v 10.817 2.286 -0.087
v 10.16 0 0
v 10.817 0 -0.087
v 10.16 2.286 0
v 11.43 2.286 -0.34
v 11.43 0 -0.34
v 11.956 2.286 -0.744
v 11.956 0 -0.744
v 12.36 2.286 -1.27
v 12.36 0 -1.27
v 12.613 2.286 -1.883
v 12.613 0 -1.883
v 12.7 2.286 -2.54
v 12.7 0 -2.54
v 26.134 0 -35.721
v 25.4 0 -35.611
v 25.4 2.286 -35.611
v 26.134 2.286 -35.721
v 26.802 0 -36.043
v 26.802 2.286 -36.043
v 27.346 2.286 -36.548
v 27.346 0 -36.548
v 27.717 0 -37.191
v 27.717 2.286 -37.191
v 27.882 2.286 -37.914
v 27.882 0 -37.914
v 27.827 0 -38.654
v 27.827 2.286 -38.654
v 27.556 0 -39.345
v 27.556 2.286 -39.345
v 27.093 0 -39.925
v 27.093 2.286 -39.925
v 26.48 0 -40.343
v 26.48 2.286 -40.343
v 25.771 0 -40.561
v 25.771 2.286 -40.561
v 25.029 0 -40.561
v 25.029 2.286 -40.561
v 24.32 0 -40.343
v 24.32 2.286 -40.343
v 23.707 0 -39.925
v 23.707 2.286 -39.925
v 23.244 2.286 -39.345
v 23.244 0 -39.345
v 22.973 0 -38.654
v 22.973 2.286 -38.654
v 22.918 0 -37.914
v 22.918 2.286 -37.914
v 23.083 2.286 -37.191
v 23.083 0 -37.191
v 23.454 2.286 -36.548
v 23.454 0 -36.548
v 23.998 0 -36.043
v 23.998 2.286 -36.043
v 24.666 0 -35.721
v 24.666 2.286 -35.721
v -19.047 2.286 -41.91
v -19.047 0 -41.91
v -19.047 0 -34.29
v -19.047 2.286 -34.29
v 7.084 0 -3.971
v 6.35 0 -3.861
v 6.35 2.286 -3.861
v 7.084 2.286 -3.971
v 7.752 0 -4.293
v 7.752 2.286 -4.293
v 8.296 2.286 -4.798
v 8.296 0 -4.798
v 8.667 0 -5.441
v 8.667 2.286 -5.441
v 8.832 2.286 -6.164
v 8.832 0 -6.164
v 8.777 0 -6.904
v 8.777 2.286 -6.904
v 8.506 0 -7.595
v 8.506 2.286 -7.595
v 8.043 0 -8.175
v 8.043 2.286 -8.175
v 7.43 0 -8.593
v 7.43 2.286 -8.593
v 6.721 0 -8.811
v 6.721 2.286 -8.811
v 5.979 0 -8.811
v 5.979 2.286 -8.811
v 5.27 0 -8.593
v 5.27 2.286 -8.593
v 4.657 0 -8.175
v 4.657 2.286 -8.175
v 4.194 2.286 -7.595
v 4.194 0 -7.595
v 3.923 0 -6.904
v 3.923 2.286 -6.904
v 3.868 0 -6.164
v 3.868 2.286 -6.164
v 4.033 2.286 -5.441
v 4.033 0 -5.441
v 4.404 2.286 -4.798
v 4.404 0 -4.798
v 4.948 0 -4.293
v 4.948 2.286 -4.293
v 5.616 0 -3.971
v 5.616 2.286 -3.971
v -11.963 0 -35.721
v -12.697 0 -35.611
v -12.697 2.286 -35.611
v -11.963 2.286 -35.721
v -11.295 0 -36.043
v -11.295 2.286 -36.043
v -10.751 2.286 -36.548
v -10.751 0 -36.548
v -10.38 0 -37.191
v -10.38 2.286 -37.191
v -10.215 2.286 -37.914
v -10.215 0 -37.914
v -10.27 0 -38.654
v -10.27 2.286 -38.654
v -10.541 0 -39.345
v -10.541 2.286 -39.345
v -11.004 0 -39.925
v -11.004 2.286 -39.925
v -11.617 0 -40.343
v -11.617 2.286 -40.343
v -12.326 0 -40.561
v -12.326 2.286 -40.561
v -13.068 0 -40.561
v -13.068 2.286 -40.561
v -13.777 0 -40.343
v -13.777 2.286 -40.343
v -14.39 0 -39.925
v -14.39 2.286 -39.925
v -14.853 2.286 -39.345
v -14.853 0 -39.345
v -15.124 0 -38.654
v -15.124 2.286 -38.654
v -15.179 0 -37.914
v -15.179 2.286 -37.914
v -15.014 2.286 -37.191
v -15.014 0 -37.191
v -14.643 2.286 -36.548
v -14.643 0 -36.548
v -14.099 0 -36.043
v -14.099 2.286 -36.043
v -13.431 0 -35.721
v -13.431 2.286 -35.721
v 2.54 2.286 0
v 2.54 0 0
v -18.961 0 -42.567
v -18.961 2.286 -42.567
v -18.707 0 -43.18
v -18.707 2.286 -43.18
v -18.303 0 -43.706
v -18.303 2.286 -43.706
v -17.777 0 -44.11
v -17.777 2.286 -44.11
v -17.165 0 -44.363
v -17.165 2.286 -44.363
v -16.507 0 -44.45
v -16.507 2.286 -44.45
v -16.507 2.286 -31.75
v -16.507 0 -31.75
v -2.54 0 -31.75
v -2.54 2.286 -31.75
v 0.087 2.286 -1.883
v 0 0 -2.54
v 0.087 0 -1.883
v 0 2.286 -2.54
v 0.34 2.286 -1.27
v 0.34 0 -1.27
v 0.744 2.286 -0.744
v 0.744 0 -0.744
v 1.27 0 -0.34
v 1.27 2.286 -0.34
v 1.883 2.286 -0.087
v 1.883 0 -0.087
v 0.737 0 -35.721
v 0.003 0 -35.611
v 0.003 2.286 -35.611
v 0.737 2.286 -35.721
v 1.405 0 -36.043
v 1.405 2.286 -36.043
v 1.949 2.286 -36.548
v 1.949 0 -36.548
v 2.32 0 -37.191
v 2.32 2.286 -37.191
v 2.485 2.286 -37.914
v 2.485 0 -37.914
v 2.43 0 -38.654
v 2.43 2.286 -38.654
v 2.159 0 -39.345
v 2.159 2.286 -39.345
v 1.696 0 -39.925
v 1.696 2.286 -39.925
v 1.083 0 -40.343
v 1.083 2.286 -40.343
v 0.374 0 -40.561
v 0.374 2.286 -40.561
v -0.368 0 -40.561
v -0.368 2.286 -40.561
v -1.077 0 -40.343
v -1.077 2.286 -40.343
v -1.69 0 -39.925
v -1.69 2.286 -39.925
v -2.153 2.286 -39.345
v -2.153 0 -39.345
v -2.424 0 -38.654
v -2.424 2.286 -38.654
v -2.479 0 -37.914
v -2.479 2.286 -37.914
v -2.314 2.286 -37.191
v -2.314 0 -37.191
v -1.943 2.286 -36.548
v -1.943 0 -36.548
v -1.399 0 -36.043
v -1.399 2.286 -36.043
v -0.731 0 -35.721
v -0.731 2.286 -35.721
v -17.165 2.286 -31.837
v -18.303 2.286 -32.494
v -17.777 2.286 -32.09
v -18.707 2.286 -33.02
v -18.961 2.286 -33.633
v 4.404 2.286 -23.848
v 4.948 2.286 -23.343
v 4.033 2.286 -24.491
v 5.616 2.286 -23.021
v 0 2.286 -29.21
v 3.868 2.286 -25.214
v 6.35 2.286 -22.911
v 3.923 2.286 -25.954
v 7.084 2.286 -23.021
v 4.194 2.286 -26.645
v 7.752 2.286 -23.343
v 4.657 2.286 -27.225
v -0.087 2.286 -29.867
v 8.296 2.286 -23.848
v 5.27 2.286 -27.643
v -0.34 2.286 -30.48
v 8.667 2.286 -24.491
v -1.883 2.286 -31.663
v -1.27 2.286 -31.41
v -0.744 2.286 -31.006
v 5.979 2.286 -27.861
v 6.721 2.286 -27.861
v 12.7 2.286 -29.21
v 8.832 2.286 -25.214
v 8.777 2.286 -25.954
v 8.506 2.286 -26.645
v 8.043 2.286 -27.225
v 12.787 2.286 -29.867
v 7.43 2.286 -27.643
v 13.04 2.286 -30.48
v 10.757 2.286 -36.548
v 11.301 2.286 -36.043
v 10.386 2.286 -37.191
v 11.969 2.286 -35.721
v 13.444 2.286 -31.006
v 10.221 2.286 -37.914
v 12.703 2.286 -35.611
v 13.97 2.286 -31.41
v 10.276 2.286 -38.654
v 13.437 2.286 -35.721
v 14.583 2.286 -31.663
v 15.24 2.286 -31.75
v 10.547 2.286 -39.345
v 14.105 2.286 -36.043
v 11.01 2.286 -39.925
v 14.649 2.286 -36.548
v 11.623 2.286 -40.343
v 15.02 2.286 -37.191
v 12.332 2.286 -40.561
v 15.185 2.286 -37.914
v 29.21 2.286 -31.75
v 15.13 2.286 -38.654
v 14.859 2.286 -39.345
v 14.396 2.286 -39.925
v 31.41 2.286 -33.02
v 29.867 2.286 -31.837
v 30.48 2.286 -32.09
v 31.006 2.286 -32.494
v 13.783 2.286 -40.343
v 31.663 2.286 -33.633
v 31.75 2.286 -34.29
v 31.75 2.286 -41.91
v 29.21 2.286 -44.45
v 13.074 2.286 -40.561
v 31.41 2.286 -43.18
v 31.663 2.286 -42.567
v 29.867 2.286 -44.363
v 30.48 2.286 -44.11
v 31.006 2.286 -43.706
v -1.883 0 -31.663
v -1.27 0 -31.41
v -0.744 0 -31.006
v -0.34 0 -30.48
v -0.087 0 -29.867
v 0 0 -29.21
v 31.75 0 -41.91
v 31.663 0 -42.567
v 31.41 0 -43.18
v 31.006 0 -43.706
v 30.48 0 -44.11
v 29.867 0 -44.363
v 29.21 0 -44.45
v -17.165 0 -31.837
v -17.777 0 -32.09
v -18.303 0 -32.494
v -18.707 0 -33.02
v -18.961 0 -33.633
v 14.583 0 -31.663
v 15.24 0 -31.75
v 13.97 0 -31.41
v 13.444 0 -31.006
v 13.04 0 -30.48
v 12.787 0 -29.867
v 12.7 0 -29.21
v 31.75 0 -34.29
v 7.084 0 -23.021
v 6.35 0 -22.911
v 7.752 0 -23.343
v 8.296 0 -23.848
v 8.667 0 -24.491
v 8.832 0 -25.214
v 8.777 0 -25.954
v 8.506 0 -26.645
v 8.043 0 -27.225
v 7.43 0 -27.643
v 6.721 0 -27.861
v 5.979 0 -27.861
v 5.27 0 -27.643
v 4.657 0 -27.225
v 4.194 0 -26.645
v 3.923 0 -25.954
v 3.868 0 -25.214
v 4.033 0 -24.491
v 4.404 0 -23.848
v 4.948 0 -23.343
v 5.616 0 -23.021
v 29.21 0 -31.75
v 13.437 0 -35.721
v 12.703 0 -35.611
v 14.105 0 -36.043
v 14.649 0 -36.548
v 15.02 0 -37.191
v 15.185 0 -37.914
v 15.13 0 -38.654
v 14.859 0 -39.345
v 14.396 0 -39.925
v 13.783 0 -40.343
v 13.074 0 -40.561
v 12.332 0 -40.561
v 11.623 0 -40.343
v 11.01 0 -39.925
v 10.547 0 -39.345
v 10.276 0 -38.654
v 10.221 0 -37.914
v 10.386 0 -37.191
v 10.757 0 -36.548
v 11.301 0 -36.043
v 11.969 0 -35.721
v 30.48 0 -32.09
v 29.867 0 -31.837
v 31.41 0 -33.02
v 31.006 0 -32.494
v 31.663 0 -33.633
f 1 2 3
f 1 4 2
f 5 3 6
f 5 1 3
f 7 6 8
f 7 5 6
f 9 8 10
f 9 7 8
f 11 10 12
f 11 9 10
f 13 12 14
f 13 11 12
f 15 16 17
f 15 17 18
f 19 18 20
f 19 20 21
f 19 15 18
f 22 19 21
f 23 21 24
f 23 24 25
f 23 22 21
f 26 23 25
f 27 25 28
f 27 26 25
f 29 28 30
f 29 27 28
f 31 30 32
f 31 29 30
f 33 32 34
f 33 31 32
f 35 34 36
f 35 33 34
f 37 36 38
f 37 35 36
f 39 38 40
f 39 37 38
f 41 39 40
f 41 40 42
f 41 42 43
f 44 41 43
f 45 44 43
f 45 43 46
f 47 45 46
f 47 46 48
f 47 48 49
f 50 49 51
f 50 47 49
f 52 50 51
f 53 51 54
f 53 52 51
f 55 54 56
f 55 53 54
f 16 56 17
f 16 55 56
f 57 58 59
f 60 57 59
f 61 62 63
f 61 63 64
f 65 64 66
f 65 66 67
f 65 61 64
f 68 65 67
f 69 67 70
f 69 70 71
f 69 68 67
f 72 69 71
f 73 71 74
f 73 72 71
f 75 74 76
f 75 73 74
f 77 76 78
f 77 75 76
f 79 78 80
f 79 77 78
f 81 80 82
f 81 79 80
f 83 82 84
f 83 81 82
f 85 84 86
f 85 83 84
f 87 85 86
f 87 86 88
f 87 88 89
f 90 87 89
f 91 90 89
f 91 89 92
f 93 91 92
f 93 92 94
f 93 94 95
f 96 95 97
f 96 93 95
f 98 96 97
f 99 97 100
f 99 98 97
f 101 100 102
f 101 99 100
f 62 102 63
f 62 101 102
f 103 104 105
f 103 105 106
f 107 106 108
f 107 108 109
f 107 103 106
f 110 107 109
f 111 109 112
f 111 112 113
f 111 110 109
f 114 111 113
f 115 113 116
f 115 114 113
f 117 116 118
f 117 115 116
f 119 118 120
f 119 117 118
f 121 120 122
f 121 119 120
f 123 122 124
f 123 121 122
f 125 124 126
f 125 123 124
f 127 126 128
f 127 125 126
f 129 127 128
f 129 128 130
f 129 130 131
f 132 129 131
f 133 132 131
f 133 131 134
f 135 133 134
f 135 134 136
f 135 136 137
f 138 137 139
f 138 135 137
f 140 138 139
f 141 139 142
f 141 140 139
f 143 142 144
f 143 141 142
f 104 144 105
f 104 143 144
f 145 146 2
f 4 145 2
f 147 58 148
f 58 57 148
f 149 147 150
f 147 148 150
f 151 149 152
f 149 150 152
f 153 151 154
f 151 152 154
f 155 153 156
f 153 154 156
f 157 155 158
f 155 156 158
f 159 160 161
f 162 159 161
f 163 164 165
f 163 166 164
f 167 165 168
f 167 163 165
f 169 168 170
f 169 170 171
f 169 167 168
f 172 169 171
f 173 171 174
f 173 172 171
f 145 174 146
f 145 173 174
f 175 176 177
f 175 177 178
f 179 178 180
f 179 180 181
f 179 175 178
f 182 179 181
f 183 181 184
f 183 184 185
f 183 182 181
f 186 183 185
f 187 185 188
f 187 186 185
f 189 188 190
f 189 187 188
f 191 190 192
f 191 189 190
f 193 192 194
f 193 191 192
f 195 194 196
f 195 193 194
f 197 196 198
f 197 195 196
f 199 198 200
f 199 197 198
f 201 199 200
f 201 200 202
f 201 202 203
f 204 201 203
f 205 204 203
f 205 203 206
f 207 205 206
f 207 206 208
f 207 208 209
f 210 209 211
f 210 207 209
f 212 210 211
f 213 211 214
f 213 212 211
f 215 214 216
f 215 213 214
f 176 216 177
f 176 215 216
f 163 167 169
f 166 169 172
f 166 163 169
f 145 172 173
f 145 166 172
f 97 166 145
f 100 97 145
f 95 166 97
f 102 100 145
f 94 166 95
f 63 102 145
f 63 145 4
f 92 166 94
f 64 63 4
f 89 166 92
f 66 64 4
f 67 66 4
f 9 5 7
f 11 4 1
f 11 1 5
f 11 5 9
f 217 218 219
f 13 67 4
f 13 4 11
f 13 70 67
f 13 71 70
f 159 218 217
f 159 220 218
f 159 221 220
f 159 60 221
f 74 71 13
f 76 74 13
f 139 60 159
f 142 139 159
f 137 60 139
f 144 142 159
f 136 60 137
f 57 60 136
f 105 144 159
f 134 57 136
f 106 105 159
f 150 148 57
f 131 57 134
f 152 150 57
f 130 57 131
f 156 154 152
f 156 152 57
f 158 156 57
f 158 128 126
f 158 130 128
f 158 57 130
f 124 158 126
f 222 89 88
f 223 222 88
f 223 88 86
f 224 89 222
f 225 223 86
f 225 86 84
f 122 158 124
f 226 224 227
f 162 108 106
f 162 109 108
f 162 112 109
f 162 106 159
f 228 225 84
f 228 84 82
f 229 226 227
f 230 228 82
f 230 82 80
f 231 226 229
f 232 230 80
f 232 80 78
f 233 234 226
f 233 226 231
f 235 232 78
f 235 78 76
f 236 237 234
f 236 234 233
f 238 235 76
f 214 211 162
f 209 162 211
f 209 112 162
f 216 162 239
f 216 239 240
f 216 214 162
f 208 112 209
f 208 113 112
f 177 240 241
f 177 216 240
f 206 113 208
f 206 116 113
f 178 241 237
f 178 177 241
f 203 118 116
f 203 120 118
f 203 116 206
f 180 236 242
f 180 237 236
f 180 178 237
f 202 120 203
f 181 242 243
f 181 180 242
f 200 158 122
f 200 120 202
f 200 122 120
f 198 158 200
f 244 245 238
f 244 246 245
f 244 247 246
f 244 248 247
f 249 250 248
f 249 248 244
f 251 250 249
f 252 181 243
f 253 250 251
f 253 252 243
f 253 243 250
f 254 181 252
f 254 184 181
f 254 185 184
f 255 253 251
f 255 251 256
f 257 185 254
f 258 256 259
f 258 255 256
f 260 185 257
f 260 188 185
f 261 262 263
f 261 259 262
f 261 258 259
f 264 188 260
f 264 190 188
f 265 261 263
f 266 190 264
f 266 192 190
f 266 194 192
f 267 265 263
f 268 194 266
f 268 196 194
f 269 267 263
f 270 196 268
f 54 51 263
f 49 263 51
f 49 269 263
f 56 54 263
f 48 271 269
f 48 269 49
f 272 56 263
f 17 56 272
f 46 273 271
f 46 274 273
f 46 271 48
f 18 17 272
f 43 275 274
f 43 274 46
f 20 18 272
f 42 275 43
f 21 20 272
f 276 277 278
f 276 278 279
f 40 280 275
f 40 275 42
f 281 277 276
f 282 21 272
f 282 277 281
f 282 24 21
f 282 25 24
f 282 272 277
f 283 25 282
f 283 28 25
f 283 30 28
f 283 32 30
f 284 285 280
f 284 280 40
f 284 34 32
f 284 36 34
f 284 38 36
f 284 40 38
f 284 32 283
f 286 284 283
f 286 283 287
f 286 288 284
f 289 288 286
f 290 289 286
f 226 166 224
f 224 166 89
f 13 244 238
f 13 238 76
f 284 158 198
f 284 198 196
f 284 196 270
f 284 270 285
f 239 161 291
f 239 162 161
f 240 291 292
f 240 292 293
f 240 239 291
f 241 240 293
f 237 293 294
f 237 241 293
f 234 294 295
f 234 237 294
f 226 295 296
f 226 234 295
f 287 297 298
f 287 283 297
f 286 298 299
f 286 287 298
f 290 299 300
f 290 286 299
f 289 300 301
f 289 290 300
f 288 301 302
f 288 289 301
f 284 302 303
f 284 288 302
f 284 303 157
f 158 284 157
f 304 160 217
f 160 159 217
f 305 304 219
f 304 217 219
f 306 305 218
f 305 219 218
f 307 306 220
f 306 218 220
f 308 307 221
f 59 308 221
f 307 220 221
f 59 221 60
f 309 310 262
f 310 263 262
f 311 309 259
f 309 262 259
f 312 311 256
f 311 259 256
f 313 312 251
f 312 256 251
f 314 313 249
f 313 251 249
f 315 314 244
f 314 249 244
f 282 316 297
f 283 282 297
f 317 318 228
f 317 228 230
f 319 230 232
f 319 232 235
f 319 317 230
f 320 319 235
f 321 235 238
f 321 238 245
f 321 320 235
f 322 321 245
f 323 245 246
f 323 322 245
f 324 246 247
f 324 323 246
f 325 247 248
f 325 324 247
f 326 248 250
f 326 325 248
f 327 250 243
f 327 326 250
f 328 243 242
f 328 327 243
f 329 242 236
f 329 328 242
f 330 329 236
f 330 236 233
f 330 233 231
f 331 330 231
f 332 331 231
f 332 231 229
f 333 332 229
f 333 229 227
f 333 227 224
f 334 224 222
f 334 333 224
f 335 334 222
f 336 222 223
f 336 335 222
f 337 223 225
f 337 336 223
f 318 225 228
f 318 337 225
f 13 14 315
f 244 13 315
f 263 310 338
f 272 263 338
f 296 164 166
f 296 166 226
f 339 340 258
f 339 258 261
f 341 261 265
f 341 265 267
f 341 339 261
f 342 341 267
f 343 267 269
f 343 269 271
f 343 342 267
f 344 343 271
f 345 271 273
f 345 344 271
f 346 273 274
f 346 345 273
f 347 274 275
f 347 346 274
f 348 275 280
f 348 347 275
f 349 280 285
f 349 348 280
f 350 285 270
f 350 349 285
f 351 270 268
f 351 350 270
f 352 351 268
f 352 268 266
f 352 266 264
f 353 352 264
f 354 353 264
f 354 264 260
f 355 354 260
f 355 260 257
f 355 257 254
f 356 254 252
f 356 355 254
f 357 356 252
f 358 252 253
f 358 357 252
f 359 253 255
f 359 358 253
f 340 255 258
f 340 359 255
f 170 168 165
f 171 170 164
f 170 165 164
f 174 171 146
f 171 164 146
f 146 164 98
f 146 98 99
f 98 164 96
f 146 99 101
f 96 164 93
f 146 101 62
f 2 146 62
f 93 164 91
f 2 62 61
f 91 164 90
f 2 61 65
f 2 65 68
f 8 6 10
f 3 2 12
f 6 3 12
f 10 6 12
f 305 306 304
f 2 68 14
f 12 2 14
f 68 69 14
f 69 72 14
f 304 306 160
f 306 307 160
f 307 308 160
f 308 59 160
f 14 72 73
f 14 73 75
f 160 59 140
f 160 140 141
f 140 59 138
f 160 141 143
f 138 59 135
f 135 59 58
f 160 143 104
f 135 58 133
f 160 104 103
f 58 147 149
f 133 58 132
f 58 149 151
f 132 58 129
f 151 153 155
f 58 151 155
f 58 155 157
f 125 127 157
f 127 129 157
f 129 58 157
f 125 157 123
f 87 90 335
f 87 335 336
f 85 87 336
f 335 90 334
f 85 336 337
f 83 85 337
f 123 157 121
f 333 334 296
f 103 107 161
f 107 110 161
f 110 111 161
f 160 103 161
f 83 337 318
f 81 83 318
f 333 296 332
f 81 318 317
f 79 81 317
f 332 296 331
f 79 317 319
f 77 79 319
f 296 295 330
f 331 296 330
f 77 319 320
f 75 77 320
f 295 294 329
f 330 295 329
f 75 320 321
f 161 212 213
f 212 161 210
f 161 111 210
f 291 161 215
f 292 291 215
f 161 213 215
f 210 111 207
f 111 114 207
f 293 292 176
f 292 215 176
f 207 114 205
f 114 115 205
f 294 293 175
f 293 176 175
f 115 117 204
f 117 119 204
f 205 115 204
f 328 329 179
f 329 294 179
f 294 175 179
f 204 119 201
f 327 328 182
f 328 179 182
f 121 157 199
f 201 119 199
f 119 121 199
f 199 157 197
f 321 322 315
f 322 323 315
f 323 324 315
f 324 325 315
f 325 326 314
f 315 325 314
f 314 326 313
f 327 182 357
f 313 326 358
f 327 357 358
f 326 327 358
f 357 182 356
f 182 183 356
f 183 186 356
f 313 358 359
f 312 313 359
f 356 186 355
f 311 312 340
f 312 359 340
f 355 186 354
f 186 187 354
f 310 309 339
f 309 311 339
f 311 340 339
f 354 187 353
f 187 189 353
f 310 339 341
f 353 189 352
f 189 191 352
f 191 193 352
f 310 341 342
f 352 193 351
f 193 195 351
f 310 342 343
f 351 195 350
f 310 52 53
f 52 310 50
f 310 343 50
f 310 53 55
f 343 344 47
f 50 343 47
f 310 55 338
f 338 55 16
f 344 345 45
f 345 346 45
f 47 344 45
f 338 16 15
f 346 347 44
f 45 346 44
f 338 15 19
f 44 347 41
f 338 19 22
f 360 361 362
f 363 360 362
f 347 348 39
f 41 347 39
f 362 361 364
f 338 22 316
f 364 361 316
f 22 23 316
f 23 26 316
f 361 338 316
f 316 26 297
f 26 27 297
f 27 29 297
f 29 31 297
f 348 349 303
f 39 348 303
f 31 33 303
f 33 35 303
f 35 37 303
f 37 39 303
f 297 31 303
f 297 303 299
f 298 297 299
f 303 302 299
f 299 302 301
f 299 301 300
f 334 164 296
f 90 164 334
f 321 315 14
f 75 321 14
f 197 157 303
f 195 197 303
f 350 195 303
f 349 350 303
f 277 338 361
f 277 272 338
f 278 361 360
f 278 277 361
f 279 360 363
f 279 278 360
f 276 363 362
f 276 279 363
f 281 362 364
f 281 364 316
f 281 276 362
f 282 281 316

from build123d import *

# Parameters (mm, degrees)
SKETCH1_R           = 2.4892
SKETCH1_W           = 12.7
SKETCH1_H           = 31.75
BOSS_EXTRUDE1_DEPTH = 2.286
FILLET1_R           = 2.54


with BuildPart() as part:
    # Sketch1 → Boss-Extrude1 (new body)
    # profile 1 of 2: a face of its own
    with BuildSketch(Plane(origin=(0, 0, 0), x_dir=(1, 0, 0), z_dir=(0, 1, 0))):
        Polygon((-19.047100434, 31.75), (0, 31.75), (12.7, 31.75), (31.75, 31.75), (31.75, 44.45), (-19.047100434, 44.45), align=None)
        with Locations(Location((-12.697100434, 38.1, 0), (0, 0, 270))):
            Circle(SKETCH1_R, mode=Mode.SUBTRACT)
        with Locations(Location((0.002899566, 38.1, 0), (0, 0, 270))):
            Circle(SKETCH1_R, mode=Mode.SUBTRACT)
        with Locations(Location((12.702899566, 38.1, 0), (0, 0, 270))):
            Circle(SKETCH1_R, mode=Mode.SUBTRACT)
        with Locations(Location((25.4, 38.1, 0), (0, 0, 270))):
            Circle(SKETCH1_R, mode=Mode.SUBTRACT)
    # profile 2 of 2: a face of its own
    with BuildSketch(Plane(origin=(0, 0, 0), x_dir=(1, 0, 0), z_dir=(0, 1, 0))):
        with Locations((6.35, 15.875)):
            Rectangle(SKETCH1_W, SKETCH1_H)
        with Locations(Location((6.35, 25.4, 0), (0, 0, 270))):
            Circle(SKETCH1_R, mode=Mode.SUBTRACT)
        with Locations(Location((6.35, 6.35, 0), (0, 0, 270))):
            Circle(SKETCH1_R, mode=Mode.SUBTRACT)
    extrude(amount=BOSS_EXTRUDE1_DEPTH)

    # Fillet1
    fillet1_edges = [part.edges().sort_by_distance(p)[0] for p in [
        (-19.047100434, 1.143, -31.75),
        (-19.047100434, 1.143, -44.45),
        (31.75, 1.143, -44.45),
        (31.75, 1.143, -31.75),
        (12.7, 1.143, -31.75),
        (12.7, 1.143, 0),
        (0, 1.143, 0),
        (0, 1.143, -31.75),
    ]]
    fillet(fillet1_edges, radius=FILLET1_R)


solid = part.part
